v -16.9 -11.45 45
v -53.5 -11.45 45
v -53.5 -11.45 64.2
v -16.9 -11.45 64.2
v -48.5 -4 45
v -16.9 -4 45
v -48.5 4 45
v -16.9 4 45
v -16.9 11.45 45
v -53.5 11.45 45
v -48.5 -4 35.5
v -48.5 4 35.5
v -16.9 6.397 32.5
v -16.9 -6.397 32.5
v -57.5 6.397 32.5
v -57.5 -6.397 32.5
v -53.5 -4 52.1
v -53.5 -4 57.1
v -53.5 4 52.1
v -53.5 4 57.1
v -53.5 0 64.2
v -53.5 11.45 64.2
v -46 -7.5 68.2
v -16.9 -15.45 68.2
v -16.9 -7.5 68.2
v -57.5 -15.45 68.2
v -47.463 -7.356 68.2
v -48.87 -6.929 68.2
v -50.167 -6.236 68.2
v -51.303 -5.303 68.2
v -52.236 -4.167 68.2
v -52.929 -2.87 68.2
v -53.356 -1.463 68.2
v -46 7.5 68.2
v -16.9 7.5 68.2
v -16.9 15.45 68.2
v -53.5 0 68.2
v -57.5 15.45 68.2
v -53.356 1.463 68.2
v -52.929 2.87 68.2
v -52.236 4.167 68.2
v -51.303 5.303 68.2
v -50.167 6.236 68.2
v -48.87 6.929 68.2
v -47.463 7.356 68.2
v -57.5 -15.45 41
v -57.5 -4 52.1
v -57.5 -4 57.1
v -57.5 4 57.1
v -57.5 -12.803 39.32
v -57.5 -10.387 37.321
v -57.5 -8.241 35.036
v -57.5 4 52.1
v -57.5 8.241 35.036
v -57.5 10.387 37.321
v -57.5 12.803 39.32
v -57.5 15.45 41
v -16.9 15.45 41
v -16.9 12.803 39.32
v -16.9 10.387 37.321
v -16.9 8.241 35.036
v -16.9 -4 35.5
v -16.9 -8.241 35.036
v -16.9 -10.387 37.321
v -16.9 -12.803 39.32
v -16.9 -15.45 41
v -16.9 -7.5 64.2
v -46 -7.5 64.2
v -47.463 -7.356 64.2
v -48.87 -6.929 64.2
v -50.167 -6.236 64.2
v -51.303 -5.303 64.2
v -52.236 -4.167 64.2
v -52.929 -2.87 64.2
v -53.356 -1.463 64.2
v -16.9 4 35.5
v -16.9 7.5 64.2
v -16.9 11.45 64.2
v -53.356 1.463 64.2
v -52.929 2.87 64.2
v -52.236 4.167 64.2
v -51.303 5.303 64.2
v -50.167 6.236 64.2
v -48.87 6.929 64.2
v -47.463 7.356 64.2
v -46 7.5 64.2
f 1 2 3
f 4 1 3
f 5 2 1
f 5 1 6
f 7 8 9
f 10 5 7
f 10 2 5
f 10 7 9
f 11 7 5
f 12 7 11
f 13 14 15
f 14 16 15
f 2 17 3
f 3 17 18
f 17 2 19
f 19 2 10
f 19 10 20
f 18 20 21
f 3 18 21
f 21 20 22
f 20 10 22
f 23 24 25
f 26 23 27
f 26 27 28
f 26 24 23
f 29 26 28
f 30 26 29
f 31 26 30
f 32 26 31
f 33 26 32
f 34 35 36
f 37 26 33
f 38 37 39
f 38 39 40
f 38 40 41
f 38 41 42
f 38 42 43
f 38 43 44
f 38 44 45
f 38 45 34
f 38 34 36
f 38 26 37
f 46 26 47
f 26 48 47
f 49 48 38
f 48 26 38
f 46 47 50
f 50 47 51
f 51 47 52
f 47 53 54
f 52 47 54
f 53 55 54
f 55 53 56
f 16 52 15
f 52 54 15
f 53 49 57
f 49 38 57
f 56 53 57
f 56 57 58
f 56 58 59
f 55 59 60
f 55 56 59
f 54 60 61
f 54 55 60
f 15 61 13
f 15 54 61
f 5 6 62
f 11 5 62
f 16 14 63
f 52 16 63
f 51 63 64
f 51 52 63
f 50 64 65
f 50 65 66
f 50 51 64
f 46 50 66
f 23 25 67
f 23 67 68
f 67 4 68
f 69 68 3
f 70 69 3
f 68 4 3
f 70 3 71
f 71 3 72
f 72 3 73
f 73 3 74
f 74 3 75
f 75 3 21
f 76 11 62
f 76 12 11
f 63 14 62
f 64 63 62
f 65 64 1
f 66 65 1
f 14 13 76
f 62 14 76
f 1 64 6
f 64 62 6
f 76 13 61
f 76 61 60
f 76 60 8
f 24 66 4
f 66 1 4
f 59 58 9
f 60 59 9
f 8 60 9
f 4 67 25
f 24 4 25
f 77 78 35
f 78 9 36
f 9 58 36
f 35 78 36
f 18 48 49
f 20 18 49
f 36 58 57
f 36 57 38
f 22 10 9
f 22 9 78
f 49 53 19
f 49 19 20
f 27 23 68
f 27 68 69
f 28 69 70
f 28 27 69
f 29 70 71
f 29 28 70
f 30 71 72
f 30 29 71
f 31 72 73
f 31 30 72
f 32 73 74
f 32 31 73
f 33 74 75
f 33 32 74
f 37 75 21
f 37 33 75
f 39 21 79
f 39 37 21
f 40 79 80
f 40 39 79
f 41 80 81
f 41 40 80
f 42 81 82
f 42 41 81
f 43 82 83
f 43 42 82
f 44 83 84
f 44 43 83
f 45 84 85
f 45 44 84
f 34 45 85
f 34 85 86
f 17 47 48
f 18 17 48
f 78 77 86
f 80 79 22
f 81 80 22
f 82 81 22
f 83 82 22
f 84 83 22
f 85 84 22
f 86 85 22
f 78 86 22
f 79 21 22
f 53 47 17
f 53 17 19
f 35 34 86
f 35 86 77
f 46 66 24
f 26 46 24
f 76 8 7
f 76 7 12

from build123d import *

# Parameters (mm, degrees)
SKETCH1_W               = 115
SKETCH1_H               = 90
BOSS_EXTRUDE1_DEPTH     = 2.5
SKETCH2_W               = 27.2
SKETCH2_H               = 30.9
SKETCH2_W_2             = 19.2
SKETCH2_H_2             = 22.9
BOSS_EXTRUDE2_DEPTH     = 40.6
SKETCH3_W               = 19.2
SKETCH3_H               = 22.9
BOSS_EXTRUDE3_DEPTH     = 4
CUT_EXTRUDE1_REACH      = 136.592
SKETCH4_W               = 5
SKETCH4_H               = 8
FILLET1_R               = 25
SKETCH5_W               = 38.2
SKETCH5_H               = 8
CUT_EXTRUDE2_DEPTH      = 39.6
CUT_EXTRUDE3_REACH      = 92.993
SKETCH6_W               = 20
SKETCH6_H               = 9.5
CUT_EXTRUDE4_REACH      = 129.903
CUT_EXTRUDE5_DEPTH      = 135.591762378
CUT_EXTRUDE5_DEPTH_BACK = 135.591762378
SKETCH9_W               = 100.7
SKETCH9_H               = 30.9
CUT_EXTRUDE6_REACH      = 92.993


# Read off the part's stored shape, not the designer's step: Mirror1
with BuildPart() as part:
    # Sketch1 → Boss-Extrude1 (new, symmetric)
    with BuildSketch(Plane(origin=(0, 0, 0), x_dir=(1, 0, 0), z_dir=(0, 1, 0))):
        Rectangle(SKETCH1_W, SKETCH1_H)
    extrude(amount=BOSS_EXTRUDE1_DEPTH, both=True)

    # Sketch2 → Boss-Extrude2 (add)
    with BuildSketch(Plane.ZY.offset(57.5)):
        with Locations((54.6, 0)):
            Rectangle(SKETCH2_W, SKETCH2_H)
        with Locations((54.6, 0)):
            Rectangle(SKETCH2_W_2, SKETCH2_H_2, mode=Mode.SUBTRACT)
    extrude(amount=-BOSS_EXTRUDE2_DEPTH)

    # Sketch3 → Boss-Extrude3 (add)
    with BuildSketch(Plane.ZY.offset(57.5)):
        with Locations((54.6, 0)):
            Rectangle(SKETCH3_W, SKETCH3_H)
    extrude(amount=-BOSS_EXTRUDE3_DEPTH)

    # Sketch4 → Cut-Extrude1 (cut, up to next)
    with BuildSketch(Plane.ZY.offset(57.5), mode=Mode.PRIVATE) as cut_extrude1_sk1:
        with Locations((54.6, 0)):
            Rectangle(SKETCH4_W, SKETCH4_H)
    cut_extrude1_tool1 = extrude(cut_extrude1_sk1.sketch, amount=-CUT_EXTRUDE1_REACH, mode=Mode.PRIVATE) & part.part
    add(cut_extrude1_tool1.solids().sort_by_distance((-57.5, 0, 54.6))[0], mode=Mode.SUBTRACT)

    # Fillet1
    # the kernel refuses this fillet: 25 mm, written as the material it adds along each edge
    with BuildSketch(Plane(origin=(-57.5, -2.5, 41), x_dir=(0, 0, -1), z_dir=(1, 0, 0))) as fillet1_piece_1:
        with BuildLine():
            CenterArc((21.904280404, -25), FILLET1_R, 90, 61.183893167)
            Line((0, -12.95), (-0.438085608, -12.709))
            ThreePointArc((-0.438085608, -12.709), (-0.5, -6.475), (-0.5, 0))
            Line((-0.5, 0), (0, 0.5))
            Line((0, 0.5), (21.904280404, 0.5))
            Line((21.904280404, 0.5), (21.904280404, 0))
        make_face()
    extrude(amount=40.6)
    with BuildSketch(Plane(origin=(-57.5, 2.5, 41), x_dir=(0, 0, -1), z_dir=(1, 0, 0))) as fillet1_piece_2:
        with BuildLine():
            CenterArc((21.904280404, 25), FILLET1_R, 208.816106833, 61.183893167)
            Line((0, 12.95), (-0.438085608, 12.709))
            ThreePointArc((-0.438085608, 12.709), (-0.5, 6.475), (-0.5, 0))
            Line((-0.5, 0), (0, -0.5))
            Line((0, -0.5), (21.904280404, -0.5))
            Line((21.904280404, -0.5), (21.904280404, 0))
        make_face()
    extrude(amount=40.6)

    # Sketch5 → Cut-Extrude2 (cut)
    with BuildSketch(Plane(origin=(-8.9, 0, 0), x_dir=(0, 0, -1), z_dir=(1, 0, 0))):
        with Locations((-54.6, 0)):
            Rectangle(SKETCH5_W, SKETCH5_H)
    extrude(amount=-CUT_EXTRUDE2_DEPTH, mode=Mode.SUBTRACT)

    # Sketch6 → Cut-Extrude3 (cut, up to next)
    with BuildSketch(Plane(origin=(0, 2.5, 0), x_dir=(1, 0, 0), z_dir=(0, 1, 0)), mode=Mode.PRIVATE) as cut_extrude3_sk1:
        with Locations((1.1, -40.25)):
            Rectangle(SKETCH6_W, SKETCH6_H)
    cut_extrude3_tool1 = extrude(cut_extrude3_sk1.sketch, amount=-CUT_EXTRUDE3_REACH, mode=Mode.PRIVATE) & part.part
    add(cut_extrude3_tool1.solids().sort_by_distance((1.1, 2.5, 40.25))[0], mode=Mode.SUBTRACT)

    # Sketch8 → Cut-Extrude4 (cut, up to next)
    with BuildSketch(Plane.XY.offset(68.2), mode=Mode.PRIVATE) as cut_extrude4_sk1:
        with BuildLine():
            Line((-46, 7.5), (-16, 7.5))
            ThreePointArc((-16, 7.5), (-8.5, 0), (-16, -7.5))
            Line((-16, -7.5), (-46, -7.5))
            ThreePointArc((-46, -7.5), (-53.5, 0), (-46, 7.5))
        make_face()
    cut_extrude4_tool1 = extrude(cut_extrude4_sk1.sketch, amount=-CUT_EXTRUDE4_REACH, mode=Mode.PRIVATE) & part.part
    add(cut_extrude4_tool1.solids().sort_by_distance((-31, 0, 68.2))[0], mode=Mode.SUBTRACT)

    # Mirror1
    split(bisect_by=Plane.XY, keep=Keep.TOP)

    # Mirror1 2: part across plane


with BuildPart() as part_1:
    add(part.part)
    add(part.part.mirror(Plane.XY))

    # Sketch9 → Cut-Extrude5 (cut, two sides: drawn at the far end of the back side and taken through both)
    with BuildSketch(Plane(origin=(57.5, 0, 0), x_dir=(0, 0, -1), z_dir=(1, 0, 0)).offset(-CUT_EXTRUDE5_DEPTH_BACK)):
        with Locations((17.85, 0)):
            Rectangle(SKETCH9_W, SKETCH9_H)
    extrude(amount=CUT_EXTRUDE5_DEPTH + CUT_EXTRUDE5_DEPTH_BACK, mode=Mode.SUBTRACT)

    # Sketch10 → Cut-Extrude6 (cut, up to next)
    with BuildSketch(Plane(origin=(0, 2.5, 0), x_dir=(1, 0, 0), z_dir=(0, 1, 0)), mode=Mode.PRIVATE) as cut_extrude6_sk1:
        Polygon((57.5, -32.5), (-16.9, -32.5), (-16.9, -35.5), (11.1, -35.5), (11.1, -45), (57.5, -45), align=None)
    cut_extrude6_tool1 = extrude(cut_extrude6_sk1.sketch, amount=-CUT_EXTRUDE6_REACH, mode=Mode.PRIVATE) & part_1.part
    add(cut_extrude6_tool1.solids().sort_by_distance((29.593976, 2.5, 38.149096))[0], mode=Mode.SUBTRACT)


solid = part_1.part
